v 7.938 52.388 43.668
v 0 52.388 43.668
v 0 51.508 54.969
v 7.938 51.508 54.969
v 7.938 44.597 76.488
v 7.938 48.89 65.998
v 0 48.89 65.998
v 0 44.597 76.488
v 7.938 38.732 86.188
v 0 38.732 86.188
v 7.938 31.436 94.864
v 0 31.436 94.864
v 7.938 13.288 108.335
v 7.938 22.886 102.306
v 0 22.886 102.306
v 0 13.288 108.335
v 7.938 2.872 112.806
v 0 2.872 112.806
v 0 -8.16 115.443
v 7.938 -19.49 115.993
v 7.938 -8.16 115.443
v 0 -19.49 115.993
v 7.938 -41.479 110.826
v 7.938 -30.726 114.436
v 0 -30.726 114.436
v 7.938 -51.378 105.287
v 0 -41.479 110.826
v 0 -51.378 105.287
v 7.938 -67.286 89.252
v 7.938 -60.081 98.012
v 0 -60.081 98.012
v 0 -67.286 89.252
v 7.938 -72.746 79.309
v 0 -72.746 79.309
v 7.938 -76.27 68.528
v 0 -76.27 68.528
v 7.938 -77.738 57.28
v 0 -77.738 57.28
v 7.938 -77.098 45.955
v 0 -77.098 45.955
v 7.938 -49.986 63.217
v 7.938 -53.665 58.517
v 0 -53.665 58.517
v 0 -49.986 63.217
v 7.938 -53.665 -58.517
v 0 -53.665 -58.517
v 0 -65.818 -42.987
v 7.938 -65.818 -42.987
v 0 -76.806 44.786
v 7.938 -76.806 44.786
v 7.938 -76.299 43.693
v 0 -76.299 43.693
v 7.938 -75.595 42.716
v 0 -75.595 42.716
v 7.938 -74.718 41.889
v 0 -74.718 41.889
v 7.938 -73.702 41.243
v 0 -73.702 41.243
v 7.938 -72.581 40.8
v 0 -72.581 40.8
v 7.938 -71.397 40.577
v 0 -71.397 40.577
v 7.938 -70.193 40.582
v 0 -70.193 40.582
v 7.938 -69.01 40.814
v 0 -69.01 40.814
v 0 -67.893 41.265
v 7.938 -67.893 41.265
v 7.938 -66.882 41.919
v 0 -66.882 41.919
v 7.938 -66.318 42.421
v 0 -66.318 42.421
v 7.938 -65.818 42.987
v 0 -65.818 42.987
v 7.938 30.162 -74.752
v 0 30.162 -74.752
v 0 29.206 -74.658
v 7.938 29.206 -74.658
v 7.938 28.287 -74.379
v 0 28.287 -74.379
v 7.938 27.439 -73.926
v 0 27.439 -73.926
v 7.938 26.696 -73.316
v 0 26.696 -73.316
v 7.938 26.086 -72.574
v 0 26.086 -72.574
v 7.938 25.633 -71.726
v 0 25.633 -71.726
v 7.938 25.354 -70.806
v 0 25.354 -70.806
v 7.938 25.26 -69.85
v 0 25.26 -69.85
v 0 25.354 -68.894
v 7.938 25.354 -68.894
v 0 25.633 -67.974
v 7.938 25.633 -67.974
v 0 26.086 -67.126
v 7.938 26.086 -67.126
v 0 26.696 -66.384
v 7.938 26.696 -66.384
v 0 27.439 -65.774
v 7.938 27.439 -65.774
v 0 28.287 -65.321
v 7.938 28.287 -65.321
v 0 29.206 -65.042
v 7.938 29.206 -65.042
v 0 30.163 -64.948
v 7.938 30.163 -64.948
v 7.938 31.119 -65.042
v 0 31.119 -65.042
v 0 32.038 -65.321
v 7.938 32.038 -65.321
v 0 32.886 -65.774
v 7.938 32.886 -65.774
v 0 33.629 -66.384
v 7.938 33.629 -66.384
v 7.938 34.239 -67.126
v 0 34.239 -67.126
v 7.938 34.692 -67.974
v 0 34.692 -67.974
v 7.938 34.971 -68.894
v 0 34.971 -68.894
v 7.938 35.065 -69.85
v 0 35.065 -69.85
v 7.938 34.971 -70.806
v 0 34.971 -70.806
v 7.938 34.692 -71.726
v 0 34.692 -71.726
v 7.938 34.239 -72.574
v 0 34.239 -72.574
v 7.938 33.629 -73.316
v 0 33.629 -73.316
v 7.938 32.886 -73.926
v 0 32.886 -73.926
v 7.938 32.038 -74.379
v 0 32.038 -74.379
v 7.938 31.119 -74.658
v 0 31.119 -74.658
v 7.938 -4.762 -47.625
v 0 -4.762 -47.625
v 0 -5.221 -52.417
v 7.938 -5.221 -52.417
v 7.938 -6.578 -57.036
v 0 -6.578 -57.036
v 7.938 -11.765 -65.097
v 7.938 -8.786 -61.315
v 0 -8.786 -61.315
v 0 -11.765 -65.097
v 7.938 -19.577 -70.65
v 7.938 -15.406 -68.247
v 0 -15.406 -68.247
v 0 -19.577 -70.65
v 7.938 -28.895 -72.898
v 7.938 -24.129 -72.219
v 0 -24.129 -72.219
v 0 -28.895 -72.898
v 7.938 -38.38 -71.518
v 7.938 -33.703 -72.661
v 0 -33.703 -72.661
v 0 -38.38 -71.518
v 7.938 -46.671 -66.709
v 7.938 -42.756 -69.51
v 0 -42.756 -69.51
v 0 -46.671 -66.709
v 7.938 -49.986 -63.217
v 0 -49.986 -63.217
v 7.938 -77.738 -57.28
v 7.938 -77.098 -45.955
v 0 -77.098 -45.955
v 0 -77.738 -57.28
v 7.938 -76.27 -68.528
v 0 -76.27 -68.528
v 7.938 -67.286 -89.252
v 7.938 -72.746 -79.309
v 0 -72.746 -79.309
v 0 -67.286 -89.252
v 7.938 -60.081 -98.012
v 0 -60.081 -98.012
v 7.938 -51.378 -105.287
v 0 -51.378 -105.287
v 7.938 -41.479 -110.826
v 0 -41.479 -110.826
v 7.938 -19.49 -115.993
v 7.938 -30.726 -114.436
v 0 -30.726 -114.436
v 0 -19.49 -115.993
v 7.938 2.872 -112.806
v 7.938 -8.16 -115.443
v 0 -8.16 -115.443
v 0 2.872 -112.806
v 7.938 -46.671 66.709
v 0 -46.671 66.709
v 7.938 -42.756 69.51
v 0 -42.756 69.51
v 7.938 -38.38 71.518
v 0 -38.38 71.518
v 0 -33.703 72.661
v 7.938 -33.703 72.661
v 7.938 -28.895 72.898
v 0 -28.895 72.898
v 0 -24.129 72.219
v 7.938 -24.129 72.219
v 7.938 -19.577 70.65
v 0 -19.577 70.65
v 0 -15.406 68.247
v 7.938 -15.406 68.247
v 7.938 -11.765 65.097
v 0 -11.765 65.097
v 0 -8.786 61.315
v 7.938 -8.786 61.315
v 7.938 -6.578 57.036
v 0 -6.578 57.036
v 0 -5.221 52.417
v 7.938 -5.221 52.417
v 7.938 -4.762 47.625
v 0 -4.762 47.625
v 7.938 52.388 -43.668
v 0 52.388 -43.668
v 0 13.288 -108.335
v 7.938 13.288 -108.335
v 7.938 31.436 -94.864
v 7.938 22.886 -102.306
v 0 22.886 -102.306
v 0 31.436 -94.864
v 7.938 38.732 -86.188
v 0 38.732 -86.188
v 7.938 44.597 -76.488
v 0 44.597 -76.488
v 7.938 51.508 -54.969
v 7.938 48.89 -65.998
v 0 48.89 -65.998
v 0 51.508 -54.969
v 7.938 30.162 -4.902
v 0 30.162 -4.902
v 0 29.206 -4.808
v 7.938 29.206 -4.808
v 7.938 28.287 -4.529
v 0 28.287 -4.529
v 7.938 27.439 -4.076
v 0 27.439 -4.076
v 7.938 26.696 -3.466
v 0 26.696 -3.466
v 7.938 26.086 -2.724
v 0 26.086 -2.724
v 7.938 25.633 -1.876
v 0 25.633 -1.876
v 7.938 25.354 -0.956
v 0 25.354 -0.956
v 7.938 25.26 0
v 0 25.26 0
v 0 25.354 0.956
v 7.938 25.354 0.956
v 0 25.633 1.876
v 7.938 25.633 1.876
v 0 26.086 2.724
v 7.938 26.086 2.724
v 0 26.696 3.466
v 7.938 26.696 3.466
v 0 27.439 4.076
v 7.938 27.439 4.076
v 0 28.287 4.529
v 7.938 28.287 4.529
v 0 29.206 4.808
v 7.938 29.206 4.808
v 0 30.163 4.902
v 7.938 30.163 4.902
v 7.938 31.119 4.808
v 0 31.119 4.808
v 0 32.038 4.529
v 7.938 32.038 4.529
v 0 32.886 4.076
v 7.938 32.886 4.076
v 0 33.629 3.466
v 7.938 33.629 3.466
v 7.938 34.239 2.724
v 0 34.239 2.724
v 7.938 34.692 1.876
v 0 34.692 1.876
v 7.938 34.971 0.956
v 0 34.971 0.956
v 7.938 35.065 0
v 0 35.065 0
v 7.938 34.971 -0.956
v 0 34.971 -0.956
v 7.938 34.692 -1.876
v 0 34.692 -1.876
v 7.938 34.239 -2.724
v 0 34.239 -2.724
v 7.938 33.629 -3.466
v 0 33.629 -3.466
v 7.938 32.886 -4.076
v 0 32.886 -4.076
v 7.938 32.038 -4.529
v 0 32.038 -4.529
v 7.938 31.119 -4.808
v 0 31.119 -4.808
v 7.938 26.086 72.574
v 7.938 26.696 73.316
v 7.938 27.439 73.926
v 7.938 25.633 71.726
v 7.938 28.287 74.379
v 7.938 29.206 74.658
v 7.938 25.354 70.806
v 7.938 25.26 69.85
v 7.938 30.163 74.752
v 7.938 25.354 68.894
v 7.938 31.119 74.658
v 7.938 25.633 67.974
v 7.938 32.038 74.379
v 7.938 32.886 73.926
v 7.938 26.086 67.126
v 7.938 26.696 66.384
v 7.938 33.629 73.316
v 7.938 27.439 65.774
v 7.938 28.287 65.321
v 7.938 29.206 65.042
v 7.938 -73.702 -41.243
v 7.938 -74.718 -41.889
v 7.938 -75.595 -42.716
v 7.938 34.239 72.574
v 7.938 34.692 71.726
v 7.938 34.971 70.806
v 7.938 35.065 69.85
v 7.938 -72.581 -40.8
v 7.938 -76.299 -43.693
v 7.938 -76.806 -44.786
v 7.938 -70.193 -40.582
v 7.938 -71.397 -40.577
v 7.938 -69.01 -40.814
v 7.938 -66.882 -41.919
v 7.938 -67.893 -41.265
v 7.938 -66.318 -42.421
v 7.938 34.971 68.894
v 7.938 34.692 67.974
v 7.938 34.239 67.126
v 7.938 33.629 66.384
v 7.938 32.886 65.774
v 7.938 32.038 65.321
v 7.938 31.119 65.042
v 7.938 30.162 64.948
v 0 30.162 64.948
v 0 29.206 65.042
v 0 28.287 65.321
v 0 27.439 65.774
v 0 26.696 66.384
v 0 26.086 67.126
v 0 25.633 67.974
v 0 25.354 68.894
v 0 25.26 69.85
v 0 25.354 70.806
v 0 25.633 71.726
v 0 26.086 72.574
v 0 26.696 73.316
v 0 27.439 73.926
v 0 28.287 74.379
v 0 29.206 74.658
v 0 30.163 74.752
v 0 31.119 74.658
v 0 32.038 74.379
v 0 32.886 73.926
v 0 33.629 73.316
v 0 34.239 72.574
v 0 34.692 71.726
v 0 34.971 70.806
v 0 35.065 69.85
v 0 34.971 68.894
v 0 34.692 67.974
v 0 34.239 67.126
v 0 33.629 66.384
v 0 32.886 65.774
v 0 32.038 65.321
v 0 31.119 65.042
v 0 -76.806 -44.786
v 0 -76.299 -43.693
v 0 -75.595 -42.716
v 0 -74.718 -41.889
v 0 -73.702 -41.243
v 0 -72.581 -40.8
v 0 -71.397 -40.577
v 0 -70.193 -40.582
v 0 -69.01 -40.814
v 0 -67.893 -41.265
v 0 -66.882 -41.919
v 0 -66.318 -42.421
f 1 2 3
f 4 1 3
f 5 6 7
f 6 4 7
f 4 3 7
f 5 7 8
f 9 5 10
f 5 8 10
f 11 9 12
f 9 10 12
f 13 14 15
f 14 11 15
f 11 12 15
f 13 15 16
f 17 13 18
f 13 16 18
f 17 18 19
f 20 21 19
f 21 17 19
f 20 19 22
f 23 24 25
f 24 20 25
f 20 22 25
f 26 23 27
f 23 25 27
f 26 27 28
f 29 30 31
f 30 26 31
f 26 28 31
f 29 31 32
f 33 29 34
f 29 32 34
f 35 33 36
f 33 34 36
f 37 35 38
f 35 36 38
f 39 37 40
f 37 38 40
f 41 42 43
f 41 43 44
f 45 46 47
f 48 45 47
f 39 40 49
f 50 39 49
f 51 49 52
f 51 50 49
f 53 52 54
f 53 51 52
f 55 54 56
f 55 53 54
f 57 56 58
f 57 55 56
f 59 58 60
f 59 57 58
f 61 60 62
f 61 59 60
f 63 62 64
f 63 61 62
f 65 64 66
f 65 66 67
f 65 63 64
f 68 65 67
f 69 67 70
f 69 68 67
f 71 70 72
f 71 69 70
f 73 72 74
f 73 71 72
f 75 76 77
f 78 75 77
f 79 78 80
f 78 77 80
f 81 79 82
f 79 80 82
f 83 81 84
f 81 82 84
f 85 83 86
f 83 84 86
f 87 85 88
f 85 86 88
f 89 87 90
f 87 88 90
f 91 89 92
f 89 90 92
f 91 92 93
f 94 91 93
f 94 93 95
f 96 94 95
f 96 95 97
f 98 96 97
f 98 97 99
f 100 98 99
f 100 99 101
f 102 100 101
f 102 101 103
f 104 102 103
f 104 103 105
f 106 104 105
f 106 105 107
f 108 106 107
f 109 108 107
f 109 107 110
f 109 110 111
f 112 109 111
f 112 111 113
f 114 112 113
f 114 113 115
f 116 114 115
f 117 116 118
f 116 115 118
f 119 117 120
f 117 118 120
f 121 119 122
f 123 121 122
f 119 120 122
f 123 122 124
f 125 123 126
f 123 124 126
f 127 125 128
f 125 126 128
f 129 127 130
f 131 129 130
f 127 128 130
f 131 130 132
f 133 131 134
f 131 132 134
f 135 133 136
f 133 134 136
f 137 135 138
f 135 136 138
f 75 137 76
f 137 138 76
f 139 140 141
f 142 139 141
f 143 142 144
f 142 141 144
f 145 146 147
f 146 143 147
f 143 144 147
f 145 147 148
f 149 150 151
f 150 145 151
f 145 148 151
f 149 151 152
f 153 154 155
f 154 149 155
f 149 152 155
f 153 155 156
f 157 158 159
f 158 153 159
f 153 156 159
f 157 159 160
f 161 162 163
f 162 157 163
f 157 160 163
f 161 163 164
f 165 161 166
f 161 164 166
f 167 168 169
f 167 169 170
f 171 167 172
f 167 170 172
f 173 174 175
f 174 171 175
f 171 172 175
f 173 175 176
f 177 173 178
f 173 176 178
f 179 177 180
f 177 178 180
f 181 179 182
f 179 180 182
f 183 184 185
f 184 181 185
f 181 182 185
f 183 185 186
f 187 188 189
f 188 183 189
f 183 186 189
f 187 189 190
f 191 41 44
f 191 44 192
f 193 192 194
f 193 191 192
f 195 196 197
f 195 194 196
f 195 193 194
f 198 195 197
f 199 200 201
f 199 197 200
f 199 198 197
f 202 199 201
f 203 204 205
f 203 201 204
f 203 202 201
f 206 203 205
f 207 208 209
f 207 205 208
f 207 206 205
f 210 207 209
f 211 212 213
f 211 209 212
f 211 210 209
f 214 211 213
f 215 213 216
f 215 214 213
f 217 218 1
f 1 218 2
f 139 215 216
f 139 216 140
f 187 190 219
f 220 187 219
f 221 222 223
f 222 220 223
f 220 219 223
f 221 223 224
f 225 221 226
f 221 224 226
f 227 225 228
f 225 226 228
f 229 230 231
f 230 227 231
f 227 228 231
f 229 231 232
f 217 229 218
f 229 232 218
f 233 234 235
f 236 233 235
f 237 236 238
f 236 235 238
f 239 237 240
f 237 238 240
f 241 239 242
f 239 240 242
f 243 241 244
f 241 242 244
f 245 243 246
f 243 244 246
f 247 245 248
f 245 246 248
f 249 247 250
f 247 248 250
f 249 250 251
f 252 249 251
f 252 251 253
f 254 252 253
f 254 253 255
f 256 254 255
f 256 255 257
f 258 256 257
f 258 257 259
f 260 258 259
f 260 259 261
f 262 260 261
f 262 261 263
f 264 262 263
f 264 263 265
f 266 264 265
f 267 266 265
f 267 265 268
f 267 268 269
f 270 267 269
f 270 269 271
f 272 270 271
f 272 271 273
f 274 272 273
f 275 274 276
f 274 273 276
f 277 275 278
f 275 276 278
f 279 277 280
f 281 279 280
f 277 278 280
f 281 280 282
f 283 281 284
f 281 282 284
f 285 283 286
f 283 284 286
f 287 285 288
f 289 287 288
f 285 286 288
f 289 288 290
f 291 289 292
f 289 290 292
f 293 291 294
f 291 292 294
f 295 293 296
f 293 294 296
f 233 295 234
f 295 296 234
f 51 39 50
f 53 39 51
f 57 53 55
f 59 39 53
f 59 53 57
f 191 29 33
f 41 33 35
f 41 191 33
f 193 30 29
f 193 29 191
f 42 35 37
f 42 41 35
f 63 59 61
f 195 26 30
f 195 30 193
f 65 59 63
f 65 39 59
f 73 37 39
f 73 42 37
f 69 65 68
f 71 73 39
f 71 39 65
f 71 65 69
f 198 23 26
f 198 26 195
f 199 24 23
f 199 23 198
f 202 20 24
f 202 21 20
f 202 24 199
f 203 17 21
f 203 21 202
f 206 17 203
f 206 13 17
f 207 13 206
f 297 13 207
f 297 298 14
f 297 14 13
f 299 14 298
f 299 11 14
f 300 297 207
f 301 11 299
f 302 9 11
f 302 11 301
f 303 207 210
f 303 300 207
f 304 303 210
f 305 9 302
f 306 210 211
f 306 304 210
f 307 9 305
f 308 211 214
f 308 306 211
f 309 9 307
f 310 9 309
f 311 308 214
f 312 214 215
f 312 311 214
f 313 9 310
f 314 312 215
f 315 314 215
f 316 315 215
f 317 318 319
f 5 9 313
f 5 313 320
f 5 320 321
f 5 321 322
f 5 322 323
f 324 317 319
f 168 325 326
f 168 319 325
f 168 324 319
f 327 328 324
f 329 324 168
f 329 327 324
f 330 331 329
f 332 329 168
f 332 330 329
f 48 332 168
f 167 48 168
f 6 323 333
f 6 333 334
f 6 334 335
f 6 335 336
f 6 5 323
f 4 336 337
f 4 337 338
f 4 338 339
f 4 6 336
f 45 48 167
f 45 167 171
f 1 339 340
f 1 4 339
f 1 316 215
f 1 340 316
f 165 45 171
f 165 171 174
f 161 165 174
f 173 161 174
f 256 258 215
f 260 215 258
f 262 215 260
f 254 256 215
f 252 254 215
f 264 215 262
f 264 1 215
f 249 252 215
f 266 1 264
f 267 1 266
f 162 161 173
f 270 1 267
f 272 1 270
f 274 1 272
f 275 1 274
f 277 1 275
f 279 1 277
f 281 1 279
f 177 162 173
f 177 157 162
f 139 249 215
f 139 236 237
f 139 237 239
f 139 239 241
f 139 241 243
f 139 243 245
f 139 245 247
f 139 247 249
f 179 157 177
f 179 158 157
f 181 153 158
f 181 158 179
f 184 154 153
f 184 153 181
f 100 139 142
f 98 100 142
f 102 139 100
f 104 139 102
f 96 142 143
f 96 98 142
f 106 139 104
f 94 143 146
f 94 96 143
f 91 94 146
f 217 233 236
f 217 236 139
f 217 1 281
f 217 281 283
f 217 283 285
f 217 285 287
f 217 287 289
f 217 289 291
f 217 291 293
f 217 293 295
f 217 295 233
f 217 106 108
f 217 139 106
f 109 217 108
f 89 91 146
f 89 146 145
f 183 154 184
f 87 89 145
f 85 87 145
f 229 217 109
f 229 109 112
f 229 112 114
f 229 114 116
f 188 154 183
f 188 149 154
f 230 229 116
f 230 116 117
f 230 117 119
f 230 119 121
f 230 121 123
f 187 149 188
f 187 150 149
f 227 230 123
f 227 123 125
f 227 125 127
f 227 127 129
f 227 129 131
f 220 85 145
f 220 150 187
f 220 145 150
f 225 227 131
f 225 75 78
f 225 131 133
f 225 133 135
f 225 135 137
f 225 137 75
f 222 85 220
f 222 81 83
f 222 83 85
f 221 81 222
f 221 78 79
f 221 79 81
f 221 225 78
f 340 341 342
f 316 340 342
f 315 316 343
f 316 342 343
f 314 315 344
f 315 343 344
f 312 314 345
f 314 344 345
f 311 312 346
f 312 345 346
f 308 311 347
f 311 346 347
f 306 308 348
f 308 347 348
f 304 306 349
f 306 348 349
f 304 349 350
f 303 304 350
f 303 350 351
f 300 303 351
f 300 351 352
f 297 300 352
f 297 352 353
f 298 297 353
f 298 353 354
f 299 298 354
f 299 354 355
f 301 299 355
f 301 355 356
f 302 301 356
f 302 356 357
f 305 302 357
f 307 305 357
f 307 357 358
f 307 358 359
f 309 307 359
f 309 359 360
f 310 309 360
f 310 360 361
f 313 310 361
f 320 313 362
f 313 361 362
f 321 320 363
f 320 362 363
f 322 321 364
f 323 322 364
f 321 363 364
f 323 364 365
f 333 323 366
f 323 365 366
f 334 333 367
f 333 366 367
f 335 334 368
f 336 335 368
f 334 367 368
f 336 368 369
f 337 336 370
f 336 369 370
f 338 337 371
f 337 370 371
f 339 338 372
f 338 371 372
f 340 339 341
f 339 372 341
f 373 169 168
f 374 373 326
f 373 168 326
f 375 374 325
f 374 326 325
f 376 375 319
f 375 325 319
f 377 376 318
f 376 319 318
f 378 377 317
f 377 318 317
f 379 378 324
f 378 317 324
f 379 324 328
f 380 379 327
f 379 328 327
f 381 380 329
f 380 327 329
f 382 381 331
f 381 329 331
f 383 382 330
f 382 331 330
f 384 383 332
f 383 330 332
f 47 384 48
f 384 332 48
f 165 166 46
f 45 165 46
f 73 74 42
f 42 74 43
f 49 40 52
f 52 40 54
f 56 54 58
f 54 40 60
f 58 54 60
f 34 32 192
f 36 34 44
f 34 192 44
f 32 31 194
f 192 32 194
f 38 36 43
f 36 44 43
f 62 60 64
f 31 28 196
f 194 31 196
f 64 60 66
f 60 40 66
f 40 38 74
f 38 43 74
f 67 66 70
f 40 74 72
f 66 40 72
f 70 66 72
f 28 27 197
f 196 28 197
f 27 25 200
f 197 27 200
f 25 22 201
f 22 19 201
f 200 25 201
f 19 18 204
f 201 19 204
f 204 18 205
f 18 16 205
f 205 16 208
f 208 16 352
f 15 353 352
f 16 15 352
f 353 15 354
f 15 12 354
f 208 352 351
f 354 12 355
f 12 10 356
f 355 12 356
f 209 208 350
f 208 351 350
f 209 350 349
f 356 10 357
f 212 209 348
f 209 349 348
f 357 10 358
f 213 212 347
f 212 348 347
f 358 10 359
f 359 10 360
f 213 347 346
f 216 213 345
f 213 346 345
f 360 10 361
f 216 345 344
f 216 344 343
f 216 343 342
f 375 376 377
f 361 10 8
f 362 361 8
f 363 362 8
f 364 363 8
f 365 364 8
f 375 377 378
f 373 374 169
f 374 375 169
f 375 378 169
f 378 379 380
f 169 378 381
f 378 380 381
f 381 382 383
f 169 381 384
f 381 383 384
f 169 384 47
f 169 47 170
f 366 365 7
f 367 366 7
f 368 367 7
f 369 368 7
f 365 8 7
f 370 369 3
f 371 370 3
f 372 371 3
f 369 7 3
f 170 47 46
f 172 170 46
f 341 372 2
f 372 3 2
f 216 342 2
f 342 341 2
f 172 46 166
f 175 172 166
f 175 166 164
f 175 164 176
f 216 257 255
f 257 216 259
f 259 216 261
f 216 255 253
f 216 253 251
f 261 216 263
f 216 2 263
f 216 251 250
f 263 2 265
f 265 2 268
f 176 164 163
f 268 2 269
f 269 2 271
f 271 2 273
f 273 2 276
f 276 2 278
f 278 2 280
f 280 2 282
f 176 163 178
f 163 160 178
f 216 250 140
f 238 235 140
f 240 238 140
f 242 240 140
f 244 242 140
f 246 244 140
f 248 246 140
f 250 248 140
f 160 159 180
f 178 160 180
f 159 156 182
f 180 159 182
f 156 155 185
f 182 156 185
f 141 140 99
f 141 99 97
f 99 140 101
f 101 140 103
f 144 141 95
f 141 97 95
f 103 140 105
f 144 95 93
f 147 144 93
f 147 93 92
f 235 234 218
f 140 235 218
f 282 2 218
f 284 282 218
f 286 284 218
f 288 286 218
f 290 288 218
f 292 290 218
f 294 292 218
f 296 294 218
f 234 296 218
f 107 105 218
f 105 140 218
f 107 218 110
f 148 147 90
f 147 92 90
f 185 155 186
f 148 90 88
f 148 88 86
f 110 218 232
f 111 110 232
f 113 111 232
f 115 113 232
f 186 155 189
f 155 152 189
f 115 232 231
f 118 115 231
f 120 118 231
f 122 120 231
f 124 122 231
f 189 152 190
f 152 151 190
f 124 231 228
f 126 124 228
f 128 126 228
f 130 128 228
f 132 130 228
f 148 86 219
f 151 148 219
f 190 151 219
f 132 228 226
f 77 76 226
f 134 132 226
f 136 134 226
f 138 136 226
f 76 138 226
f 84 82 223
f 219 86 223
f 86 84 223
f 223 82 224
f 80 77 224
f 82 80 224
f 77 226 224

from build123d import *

# Parameters (mm, degrees)
BOSS_EXTRUDE1_DEPTH          = 7.9375
FILLET1_R                    = 25.4
FILLET2_R                    = 16.51
F_3_8_CLEARANCE_HOLE1_D      = 9.8044
EXTRUDE_THIN1_DEPTH          = 7.9375
CUT_EXTRUDE_THIN2_START      = -7.9375
CUT_EXTRUDE_THIN2_DEPTH      = 7.9375
CUT_EXTRUDE_THIN1_DEPTH      = 171.11453265
CUT_EXTRUDE_THIN1_DEPTH_BACK = 152.4
FILLET4_R                    = 6.35


with BuildPart() as part:
    # Sketch1 → Boss-Extrude1 (new body)
    with BuildSketch(Plane(origin=(0, 0, 0), x_dir=(0, 0, -1), z_dir=(1, 0, 0))):
        with BuildLine():
            Line((34.925, -84.1375), (63.5, -84.1375))
            ThreePointArc((63.5, -84.1375), (147.6375, 0), (63.5, 84.1375))
            Line((63.5, 84.1375), (-63.5, 84.1375))
            ThreePointArc((-63.5, 84.1375), (-147.6375, 0), (-63.5, -84.1375))
            Line((-63.5, -84.1375), (-34.925, -84.1375))
            Line((-34.925, -84.1375), (-31.75, -74.6125))
            Line((-31.75, -74.6125), (-68.2625, -46.0375))
            Line((-68.2625, -46.0375), (-68.2625, -4.7625))
            Line((-68.2625, -4.7625), (68.2625, -4.7625))
            Line((68.2625, -4.7625), (68.2625, -46.0375))
            Line((68.2625, -46.0375), (31.75, -74.6125))
            Line((31.75, -74.6125), (34.925, -84.1375))
        make_face()
    extrude(amount=BOSS_EXTRUDE1_DEPTH)

    # Fillet1
    fillet1_edges = [part.edges().sort_by_distance(p)[0] for p in [
        (3.96875, -46.0375, -68.2625),
        (3.96875, -46.0375, 68.2625),
    ]]
    fillet(fillet1_edges, radius=FILLET1_R)

    # Fillet2
    fillet2_edges = [part.edges().sort_by_distance(p)[0] for p in [
        (3.96875, -4.7625, -68.2625),
        (3.96875, -4.7625, 68.2625),
    ]]
    fillet(fillet2_edges, radius=FILLET2_R)

    # 3/8 Clearance Hole1 (through all)
    with Locations(Plane(origin=(7.9375, 30.1625, 69.85), x_dir=(0, 0, 1), z_dir=(1, 0, 0))):
        with Locations((0, 0), (-69.85, 0), (-139.7, 0)):
            Hole(F_3_8_CLEARANCE_HOLE1_D / 2)

    # Sketch9 → Extrude-Thin1 (add)
    with BuildSketch(Plane(origin=(7.9375, 0, 0), x_dir=(0, 0, -1), z_dir=(1, 0, 0))):
        with BuildLine():
            Line((-31.75, -74.6125), (-63.217410815, -49.985830667))
            ThreePointArc((-63.217410815, -49.985830667), (-71.54294782, -21.815600163), (-47.625, -4.7625))
            Line((-47.625, -4.7625), (47.625, -4.7625))
            ThreePointArc((47.625, -4.7625), (71.54294782, -21.815600163), (63.217410815, -49.985830667))
            Line((63.217410815, -49.985830667), (31.75, -74.6125))
            Line((31.75, -74.6125), (34.880845969, -78.613025405))
            Line((34.880845969, -78.613025405), (66.348256784, -53.986356072))
            ThreePointArc((66.348256784, -53.986356072), (76.34550282, -20.159742237), (47.625, 0.3175))
            Line((47.625, 0.3175), (-47.625, 0.3175))
            ThreePointArc((-47.625, 0.3175), (-76.34550282, -20.159742237), (-66.348256784, -53.986356072))
            Line((-66.348256784, -53.986356072), (-34.880845969, -78.613025405))
            Line((-34.880845969, -78.613025405), (-31.75, -74.6125))
        make_face()
    extrude(amount=-EXTRUDE_THIN1_DEPTH)

    # Sketch9<2> → Cut-Extrude-Thin2 (cut)
    with BuildSketch(Plane(origin=(7.9375, 0, 0), x_dir=(0, 0, -1), z_dir=(1, 0, 0)).offset(CUT_EXTRUDE_THIN2_START)):
        with BuildLine():
            Line((-31.75, -74.6125), (-63.217410815, -49.985830667))
            ThreePointArc((-63.217410815, -49.985830667), (-71.54294782, -21.815600163), (-47.625, -4.7625))
            Line((-47.625, -4.7625), (47.625, -4.7625))
            ThreePointArc((47.625, -4.7625), (71.54294782, -21.815600163), (63.217410815, -49.985830667))
            Line((63.217410815, -49.985830667), (31.75, -74.6125))
            Line((31.75, -74.6125), (27.053731046, -68.611711892))
            Line((27.053731046, -68.611711892), (58.521141861, -43.985042559))
            ThreePointArc((58.521141861, -43.985042559), (64.339115319, -24.299387052), (47.625, -12.3825))
            Line((47.625, -12.3825), (-47.625, -12.3825))
            ThreePointArc((-47.625, -12.3825), (-64.339115319, -24.299387052), (-58.521141861, -43.985042559))
            Line((-58.521141861, -43.985042559), (-27.053731046, -68.611711892))
            Line((-27.053731046, -68.611711892), (-31.75, -74.6125))
        make_face()
    extrude(amount=CUT_EXTRUDE_THIN2_DEPTH, mode=Mode.SUBTRACT)

    # Sketch7 → Cut-Extrude-Thin1 (cut, two sides: drawn at the far end of the back side and taken through both)
    with BuildSketch(Plane(origin=(7.9375, 0, 0), x_dir=(0, 0, -1), z_dir=(1, 0, 0)).offset(-CUT_EXTRUDE_THIN1_DEPTH_BACK)):
        with BuildLine():
            Line((31.75, -74.6125), (44.45, -76.851852655))
            ThreePointArc((44.45, -76.851852655), (101.359893984, -56.480810426), (112.805620908, 2.871617747))
            ThreePointArc((112.805620908, 2.871617747), (86.188258708, 38.731700552), (43.668279277, 52.3875))
            Line((43.668279277, 52.3875), (-43.668279277, 52.3875))
            ThreePointArc((-43.668279277, 52.3875), (-86.188258708, 38.731700552), (-112.805620908, 2.871617747))
            ThreePointArc((-112.805620908, 2.871617747), (-101.359893984, -56.480810426), (-44.45, -76.851852655))
            Line((-44.45, -76.851852655), (-31.75, -74.6125))
            Line((-31.75, -74.6125), (-23.810805317, -119.637910468))
            Line((-23.810805317, -119.637910468), (-36.510805317, -121.877263123))
            ThreePointArc((-36.510805317, -121.877263123), (-136.068541071, -86.240316762), (-156.091608712, 17.590369727))
            ThreePointArc((-156.091608712, 17.590369727), (-112.809463221, 75.901982637), (-43.668279277, 98.1075))
            Line((-43.668279277, 98.1075), (43.668279277, 98.1075))
            ThreePointArc((43.668279277, 98.1075), (112.809463221, 75.901982637), (156.091608712, 17.590369727))
            ThreePointArc((156.091608712, 17.590369727), (136.068541071, -86.240316762), (36.510805317, -121.877263123))
            Line((36.510805317, -121.877263123), (23.810805317, -119.637910468))
            Line((23.810805317, -119.637910468), (31.75, -74.6125))
        make_face()
    extrude(amount=CUT_EXTRUDE_THIN1_DEPTH + CUT_EXTRUDE_THIN1_DEPTH_BACK, mode=Mode.SUBTRACT)

    # Fillet4
    fillet4_edges = [part.edges().sort_by_distance(p)[0] for p in [
        (3.96875, -74.6125, 31.75),
        (3.96875, -74.6125, -31.75),
    ]]
    fillet(fillet4_edges, radius=FILLET4_R)


solid = part.part
